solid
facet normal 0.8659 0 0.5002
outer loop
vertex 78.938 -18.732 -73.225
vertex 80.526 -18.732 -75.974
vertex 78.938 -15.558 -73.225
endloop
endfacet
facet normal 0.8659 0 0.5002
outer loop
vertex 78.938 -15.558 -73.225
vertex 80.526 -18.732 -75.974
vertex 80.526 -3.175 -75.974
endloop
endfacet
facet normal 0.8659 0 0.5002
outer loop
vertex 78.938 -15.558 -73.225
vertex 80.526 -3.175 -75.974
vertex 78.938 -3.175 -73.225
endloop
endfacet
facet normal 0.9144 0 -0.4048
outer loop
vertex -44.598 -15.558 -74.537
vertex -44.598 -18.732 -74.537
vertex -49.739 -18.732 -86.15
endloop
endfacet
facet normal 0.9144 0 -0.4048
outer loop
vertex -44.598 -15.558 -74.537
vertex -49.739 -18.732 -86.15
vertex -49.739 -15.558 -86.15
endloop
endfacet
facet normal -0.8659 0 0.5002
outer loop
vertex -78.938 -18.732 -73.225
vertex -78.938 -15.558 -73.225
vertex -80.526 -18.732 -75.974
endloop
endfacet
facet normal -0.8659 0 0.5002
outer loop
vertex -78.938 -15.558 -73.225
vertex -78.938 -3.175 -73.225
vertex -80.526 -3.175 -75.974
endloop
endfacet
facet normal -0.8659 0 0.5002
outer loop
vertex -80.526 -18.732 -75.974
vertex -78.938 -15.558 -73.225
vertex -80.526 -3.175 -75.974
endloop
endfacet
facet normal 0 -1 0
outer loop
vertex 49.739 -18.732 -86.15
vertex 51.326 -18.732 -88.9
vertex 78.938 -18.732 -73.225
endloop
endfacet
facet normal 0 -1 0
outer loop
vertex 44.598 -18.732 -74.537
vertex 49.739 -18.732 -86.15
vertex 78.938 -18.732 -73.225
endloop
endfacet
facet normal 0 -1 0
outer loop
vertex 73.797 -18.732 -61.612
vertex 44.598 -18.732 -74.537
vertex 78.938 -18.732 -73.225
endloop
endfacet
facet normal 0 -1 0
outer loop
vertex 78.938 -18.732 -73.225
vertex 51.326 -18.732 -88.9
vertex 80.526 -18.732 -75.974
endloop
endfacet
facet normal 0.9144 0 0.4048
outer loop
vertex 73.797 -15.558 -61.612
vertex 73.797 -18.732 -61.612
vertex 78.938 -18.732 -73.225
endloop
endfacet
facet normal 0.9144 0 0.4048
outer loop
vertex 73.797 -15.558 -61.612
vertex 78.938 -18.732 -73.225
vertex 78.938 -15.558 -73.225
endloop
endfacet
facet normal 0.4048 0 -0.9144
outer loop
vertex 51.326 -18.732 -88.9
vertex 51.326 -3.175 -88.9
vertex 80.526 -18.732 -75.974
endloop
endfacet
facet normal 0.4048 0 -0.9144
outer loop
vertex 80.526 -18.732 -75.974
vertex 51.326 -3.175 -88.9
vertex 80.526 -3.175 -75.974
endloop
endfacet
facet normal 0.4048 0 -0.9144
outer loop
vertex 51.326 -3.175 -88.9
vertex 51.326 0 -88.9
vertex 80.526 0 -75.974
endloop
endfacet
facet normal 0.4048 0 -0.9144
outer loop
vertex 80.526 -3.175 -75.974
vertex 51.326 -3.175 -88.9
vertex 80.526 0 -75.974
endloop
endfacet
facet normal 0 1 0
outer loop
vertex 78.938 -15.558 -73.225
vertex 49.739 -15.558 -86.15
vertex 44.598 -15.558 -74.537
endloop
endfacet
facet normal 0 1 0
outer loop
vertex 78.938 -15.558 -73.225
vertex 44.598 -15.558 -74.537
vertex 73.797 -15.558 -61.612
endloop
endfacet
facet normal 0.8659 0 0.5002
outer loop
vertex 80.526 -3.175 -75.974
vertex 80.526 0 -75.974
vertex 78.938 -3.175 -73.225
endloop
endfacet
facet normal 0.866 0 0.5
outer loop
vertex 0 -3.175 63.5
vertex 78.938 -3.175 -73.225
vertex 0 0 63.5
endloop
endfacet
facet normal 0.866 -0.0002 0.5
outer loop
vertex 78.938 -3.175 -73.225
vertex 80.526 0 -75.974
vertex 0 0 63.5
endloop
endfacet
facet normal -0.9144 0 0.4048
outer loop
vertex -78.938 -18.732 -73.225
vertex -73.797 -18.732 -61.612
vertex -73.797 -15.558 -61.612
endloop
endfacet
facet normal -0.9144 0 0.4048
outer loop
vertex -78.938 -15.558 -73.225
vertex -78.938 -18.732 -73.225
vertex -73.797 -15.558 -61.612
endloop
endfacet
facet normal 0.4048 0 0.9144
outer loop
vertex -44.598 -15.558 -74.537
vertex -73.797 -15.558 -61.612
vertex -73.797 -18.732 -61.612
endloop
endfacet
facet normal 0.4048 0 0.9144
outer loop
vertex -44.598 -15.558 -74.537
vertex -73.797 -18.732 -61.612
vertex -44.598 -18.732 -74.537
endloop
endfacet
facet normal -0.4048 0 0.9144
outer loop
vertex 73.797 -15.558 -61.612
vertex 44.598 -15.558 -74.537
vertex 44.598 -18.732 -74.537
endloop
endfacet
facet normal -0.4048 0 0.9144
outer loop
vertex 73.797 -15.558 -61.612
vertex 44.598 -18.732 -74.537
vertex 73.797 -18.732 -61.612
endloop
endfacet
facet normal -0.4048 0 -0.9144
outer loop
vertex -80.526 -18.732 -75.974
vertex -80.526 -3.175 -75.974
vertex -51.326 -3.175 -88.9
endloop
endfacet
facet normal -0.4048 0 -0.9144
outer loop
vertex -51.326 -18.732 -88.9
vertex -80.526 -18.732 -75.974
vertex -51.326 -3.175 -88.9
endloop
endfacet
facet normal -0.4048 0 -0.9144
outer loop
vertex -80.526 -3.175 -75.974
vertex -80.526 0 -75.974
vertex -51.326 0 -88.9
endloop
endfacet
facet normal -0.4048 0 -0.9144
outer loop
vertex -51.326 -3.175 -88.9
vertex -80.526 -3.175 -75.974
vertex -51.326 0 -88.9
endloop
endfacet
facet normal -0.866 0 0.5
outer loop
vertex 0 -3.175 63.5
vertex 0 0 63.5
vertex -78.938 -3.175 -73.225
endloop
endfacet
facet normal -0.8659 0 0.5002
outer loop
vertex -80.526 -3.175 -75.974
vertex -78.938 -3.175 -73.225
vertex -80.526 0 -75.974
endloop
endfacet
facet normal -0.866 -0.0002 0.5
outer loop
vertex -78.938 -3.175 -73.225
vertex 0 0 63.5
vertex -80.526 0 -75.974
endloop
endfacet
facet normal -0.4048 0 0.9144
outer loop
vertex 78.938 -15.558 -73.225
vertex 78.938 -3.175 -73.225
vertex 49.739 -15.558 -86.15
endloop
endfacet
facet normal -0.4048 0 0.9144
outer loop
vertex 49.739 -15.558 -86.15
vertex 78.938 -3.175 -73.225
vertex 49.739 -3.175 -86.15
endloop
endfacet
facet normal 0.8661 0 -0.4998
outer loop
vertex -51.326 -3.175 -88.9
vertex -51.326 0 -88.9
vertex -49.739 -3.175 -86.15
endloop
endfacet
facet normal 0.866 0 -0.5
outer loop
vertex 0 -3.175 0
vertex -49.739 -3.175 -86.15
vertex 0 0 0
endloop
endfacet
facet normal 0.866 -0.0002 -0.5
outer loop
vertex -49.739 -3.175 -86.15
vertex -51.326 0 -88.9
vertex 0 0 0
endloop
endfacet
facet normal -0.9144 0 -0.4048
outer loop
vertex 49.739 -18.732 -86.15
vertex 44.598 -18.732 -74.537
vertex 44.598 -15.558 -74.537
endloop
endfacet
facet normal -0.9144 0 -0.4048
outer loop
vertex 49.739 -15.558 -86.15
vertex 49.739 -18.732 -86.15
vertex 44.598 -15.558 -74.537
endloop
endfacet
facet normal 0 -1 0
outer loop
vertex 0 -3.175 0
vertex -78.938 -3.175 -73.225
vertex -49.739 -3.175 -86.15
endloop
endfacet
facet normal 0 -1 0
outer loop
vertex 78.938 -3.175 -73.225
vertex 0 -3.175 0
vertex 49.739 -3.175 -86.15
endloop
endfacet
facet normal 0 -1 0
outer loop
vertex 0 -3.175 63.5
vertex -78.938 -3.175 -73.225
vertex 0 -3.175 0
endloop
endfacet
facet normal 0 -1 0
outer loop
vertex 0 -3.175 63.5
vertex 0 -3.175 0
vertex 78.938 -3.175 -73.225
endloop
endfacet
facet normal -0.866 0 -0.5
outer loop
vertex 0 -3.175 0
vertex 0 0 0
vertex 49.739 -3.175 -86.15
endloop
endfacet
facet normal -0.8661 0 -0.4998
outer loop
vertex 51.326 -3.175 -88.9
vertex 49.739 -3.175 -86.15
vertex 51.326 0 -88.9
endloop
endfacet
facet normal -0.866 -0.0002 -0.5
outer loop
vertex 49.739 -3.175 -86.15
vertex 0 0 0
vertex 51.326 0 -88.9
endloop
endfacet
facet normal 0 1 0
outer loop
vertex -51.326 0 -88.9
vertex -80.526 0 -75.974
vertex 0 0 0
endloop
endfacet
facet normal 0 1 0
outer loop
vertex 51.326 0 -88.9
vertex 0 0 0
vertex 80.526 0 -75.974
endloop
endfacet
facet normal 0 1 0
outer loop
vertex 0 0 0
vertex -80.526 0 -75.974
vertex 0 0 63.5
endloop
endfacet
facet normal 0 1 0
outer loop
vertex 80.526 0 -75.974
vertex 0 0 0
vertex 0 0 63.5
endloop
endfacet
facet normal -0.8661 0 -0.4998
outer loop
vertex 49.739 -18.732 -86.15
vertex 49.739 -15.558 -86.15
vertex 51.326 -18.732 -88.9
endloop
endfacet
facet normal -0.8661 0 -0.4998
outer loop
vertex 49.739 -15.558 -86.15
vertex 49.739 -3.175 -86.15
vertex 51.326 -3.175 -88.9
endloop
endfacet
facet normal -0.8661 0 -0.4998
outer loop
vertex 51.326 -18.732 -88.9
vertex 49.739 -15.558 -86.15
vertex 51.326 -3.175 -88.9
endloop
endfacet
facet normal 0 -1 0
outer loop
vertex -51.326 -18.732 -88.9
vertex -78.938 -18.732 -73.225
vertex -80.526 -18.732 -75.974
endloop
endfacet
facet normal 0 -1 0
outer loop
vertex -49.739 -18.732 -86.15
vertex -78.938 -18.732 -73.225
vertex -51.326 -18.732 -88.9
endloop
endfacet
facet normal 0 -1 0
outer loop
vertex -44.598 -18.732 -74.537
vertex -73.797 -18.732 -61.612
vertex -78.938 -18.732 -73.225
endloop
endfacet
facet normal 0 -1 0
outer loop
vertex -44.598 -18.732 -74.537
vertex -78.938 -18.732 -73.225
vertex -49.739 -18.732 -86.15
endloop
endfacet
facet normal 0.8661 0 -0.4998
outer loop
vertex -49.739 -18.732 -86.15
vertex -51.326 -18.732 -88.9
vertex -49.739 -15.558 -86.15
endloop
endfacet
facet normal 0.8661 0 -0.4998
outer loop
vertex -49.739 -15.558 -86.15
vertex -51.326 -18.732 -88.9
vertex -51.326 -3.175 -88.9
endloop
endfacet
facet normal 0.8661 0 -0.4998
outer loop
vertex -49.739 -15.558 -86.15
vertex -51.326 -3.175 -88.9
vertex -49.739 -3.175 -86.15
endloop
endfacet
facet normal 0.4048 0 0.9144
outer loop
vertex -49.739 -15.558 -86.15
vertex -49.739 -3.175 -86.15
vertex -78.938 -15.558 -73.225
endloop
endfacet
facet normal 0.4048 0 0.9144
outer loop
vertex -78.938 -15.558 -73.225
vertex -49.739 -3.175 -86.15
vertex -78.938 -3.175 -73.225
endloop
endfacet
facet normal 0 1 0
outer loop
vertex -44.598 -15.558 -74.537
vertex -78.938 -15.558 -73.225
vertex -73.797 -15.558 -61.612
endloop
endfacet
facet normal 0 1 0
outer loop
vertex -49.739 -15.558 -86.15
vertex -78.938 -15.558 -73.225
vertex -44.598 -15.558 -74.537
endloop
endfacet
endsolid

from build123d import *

# Parameters (mm, degrees)
F1_DEPTH = 3.175
F3_DEPTH = 15.5575
F4_W     = 31.932119
F4_H     = 3.175
F5_DEPTH = 12.7
F6_W     = 31.932119
F6_H     = 3.175
F7_DEPTH = 12.7


with BuildPart() as f1:
    # F0 (on Front) → F1 (new body)
    with BuildSketch(Plane.XZ):
        Polygon((0, 63.5), (0, 0), (51.326439, -88.9), (80.525518, -75.974289), align=None)
        Polygon((-51.326439, -88.9), (0, 0), (0, 63.5), (-80.525518, -75.974289), align=None)
    extrude(amount=F1_DEPTH)

    # F2 (on face) → F3 (join)
    with BuildSketch(Plane.XZ.offset(3.175)):
        Polygon((-78.938018, -73.224658), (-80.525518, -75.974289), (-51.326439, -88.9), (-49.738939, -86.150369), align=None)
        Polygon((49.738939, -86.150369), (51.326439, -88.9), (80.525518, -75.974289), (78.938018, -73.224658), align=None)
    extrude(amount=F3_DEPTH)

    # F4 (on face) → F5 (join)
    with BuildSketch(Plane(origin=(-40.037708, 0, -90.444865), x_dir=(0.914411, 0, -0.404787), z_dir=(0.404787, 0, 0.914411))):
        with Locations((-26.575328, -17.145)):
            Rectangle(F4_W, F4_H)
    extrude(amount=F5_DEPTH)

    # F6 (on face) → F7 (join)
    with BuildSketch(Plane(origin=(40.037708, 0, -90.444865), x_dir=(0.914411, 0, 0.404787), z_dir=(-0.404787, 0, 0.914411))):
        with Locations((26.575328, -17.145)):
            Rectangle(F6_W, F6_H)
    extrude(amount=F7_DEPTH)


solid = f1.part
